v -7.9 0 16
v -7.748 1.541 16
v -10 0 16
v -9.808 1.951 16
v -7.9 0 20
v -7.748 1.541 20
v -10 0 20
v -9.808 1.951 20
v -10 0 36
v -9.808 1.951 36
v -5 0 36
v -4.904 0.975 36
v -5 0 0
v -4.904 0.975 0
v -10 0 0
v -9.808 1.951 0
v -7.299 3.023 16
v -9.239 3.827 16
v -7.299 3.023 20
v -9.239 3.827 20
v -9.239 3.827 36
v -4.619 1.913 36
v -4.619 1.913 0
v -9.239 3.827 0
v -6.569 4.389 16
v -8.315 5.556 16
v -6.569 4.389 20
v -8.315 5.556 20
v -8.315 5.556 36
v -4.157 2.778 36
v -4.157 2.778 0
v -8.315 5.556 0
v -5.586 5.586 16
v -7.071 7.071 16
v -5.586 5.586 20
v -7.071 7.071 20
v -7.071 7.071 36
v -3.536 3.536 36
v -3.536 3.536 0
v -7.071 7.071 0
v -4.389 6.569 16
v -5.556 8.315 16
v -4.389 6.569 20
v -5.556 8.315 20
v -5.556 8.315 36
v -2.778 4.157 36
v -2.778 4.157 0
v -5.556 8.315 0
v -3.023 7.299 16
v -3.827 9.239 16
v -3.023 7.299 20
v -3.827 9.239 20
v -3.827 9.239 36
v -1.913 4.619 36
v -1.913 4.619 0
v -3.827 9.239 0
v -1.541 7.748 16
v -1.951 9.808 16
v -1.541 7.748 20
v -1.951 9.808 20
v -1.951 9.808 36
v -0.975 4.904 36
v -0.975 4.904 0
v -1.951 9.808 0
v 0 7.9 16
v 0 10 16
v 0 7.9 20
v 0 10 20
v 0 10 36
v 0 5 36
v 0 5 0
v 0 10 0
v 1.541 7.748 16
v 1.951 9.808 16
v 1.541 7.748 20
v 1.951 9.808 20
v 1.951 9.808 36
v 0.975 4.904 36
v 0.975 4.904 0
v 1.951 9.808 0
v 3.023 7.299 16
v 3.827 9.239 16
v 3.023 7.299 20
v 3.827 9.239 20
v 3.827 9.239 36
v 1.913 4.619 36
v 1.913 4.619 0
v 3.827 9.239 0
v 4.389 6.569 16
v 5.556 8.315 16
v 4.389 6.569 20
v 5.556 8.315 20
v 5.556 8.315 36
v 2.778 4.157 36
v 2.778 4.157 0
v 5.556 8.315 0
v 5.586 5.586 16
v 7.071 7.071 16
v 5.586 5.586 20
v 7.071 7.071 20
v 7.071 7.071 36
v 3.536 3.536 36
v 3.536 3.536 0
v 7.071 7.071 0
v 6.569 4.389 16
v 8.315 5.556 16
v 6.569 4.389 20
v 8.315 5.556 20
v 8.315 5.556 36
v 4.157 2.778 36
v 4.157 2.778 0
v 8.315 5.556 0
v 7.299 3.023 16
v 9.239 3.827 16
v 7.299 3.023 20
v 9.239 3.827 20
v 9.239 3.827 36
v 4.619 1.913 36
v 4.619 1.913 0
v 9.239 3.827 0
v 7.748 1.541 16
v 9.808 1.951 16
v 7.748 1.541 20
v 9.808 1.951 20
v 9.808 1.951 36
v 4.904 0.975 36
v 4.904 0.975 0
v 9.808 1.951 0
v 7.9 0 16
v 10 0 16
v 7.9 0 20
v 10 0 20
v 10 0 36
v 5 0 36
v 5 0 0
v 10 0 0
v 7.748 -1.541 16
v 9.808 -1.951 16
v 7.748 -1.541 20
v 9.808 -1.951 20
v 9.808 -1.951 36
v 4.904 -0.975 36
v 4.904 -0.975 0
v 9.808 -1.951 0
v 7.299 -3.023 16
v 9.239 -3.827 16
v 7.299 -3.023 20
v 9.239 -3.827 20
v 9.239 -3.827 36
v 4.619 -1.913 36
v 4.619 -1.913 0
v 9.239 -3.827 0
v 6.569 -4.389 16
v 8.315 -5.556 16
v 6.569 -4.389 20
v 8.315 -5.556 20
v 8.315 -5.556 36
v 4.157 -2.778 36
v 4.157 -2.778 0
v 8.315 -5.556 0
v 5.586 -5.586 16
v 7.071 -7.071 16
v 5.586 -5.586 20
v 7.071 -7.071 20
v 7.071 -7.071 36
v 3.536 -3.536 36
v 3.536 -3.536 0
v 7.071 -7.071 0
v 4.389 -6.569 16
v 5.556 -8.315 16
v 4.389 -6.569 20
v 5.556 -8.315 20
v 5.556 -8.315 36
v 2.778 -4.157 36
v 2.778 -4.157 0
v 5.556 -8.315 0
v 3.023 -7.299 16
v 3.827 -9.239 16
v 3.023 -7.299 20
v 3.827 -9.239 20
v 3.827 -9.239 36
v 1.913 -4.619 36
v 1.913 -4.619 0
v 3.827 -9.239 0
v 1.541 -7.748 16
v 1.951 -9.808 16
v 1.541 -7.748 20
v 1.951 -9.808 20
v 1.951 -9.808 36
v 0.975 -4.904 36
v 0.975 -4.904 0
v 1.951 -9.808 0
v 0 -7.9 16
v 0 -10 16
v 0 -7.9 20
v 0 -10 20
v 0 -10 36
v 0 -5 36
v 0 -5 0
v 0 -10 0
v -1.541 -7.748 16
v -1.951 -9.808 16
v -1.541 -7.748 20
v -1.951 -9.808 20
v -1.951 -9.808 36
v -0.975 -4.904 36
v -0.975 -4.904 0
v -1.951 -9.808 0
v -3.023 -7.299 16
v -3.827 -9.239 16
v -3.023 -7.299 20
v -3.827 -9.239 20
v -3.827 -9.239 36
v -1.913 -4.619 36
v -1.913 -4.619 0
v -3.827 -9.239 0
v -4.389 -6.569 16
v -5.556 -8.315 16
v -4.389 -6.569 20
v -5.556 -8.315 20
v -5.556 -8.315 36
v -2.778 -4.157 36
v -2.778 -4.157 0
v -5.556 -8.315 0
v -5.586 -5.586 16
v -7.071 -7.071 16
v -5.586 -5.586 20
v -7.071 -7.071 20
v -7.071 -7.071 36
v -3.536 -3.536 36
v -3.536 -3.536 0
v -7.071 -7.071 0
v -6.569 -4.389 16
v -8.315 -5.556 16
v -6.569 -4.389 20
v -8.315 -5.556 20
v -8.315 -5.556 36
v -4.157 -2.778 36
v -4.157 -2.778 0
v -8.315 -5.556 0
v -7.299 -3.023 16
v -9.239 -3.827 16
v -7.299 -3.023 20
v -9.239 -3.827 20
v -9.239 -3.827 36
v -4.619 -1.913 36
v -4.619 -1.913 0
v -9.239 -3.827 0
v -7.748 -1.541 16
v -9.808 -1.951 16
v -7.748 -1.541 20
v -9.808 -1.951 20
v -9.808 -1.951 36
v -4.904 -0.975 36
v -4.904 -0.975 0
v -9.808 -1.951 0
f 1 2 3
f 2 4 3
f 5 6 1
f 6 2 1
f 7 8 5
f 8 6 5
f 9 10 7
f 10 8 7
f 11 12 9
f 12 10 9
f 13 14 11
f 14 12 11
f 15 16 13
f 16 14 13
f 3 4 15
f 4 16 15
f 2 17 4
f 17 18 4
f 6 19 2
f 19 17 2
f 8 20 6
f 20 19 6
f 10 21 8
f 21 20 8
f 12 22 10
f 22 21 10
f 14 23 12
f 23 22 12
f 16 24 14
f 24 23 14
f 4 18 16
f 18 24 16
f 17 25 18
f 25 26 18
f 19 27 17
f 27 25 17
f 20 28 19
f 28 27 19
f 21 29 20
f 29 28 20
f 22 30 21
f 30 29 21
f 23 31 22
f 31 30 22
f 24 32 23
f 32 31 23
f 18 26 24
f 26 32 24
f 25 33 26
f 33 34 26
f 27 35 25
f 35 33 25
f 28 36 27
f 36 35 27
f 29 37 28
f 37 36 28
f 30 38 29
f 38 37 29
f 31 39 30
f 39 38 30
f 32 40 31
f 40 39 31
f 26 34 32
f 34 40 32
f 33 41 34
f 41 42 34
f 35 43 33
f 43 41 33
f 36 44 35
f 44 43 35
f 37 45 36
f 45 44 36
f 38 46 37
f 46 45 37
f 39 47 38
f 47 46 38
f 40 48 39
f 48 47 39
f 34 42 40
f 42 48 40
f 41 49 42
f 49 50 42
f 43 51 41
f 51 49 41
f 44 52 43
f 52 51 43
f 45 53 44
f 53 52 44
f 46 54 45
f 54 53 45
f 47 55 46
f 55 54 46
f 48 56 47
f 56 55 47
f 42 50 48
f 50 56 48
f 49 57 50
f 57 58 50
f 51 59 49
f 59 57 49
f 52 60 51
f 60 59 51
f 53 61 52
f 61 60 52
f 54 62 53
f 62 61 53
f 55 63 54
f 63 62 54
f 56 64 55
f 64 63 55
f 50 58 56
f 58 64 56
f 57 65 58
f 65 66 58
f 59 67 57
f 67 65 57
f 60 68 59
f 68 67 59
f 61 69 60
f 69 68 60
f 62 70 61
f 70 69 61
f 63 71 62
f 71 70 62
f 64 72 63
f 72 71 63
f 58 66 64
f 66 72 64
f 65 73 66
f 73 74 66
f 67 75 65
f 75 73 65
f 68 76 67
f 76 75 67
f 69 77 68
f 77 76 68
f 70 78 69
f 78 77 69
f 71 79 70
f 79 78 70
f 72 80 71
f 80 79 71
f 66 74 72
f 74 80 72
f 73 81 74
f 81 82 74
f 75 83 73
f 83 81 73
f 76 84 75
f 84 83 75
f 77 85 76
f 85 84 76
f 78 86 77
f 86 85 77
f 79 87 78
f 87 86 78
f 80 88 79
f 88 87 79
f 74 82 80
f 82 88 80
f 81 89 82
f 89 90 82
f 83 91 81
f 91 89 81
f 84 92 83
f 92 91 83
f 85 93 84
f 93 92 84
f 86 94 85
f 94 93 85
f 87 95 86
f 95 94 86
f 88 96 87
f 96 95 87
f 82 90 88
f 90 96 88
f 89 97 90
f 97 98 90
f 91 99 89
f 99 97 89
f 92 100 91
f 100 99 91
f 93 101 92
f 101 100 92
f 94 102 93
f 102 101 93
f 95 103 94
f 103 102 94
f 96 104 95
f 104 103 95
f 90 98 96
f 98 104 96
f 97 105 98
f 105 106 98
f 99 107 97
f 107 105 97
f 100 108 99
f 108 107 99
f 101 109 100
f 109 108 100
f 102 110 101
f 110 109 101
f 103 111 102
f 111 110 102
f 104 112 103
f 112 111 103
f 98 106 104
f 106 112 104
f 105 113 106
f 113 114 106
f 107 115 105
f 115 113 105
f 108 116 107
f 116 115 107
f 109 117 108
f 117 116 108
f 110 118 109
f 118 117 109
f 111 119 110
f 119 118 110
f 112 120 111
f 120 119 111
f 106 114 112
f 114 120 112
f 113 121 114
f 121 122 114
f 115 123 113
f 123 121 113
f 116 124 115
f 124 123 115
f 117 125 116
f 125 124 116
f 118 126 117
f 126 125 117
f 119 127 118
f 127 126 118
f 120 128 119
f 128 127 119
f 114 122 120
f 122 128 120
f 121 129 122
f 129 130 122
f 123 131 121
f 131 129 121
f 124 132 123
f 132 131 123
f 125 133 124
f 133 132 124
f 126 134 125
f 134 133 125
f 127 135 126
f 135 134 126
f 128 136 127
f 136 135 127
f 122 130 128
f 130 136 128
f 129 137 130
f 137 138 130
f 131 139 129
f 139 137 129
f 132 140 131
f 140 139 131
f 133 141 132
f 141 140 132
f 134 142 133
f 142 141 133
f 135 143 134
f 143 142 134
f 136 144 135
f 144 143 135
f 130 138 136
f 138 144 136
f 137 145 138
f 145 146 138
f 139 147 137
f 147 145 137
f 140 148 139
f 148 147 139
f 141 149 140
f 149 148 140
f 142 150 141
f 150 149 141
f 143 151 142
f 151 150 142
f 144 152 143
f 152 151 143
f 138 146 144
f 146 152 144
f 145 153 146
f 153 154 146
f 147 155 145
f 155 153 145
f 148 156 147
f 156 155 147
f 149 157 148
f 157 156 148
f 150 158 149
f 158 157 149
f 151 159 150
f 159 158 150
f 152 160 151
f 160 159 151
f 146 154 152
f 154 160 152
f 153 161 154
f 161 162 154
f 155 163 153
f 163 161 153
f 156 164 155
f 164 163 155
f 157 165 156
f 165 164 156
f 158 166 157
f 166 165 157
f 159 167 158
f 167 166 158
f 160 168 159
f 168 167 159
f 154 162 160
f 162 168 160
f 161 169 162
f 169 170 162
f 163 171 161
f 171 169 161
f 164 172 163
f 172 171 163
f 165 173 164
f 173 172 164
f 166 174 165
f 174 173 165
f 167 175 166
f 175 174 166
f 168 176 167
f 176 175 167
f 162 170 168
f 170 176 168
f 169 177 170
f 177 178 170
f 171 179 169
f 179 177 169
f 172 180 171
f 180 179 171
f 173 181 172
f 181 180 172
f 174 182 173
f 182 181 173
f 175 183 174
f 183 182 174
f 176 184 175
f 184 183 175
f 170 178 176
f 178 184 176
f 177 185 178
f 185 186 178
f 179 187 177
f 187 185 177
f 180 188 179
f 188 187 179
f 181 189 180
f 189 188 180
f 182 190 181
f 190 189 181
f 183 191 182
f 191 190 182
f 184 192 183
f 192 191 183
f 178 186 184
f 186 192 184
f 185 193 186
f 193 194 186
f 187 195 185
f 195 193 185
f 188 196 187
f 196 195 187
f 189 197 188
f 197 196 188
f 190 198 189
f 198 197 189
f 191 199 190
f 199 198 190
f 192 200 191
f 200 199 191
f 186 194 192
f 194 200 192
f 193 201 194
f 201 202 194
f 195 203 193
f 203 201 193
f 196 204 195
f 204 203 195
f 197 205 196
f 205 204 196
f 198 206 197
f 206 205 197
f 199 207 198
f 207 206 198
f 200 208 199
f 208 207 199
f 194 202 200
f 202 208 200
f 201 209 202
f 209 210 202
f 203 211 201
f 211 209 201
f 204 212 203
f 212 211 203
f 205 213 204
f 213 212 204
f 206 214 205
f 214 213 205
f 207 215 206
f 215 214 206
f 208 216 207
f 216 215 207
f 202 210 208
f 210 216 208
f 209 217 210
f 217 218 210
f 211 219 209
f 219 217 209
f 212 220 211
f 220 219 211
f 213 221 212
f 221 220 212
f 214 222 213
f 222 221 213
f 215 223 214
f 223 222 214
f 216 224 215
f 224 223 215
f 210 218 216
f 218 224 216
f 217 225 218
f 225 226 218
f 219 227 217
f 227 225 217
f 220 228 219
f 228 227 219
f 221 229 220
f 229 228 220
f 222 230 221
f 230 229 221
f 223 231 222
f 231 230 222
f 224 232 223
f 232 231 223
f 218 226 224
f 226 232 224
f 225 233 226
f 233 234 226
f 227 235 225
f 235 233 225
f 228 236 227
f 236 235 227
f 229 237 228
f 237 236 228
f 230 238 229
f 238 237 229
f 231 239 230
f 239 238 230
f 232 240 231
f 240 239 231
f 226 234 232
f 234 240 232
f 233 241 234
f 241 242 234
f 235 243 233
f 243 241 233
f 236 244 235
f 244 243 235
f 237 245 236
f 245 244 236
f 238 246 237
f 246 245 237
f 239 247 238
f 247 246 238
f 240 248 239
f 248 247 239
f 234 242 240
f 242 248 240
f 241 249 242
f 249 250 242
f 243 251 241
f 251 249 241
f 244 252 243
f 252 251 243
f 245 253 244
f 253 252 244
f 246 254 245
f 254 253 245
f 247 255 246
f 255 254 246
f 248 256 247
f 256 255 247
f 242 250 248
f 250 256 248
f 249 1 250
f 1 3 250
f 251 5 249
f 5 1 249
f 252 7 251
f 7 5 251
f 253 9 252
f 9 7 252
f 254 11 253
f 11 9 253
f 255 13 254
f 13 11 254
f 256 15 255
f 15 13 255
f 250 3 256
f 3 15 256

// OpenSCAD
$fn = 32;

// ----------------------------------------------------------------------
// Grooved revolve: stepped, bore R5
// ----------------------------------------------------------------------

// --- parameters (mm) ---
bore_r = 5;               // bore radius
outer_r = 10;             // outer radius of the body
total_h = 36;             // overall height, Z
wall = 5;                 // radial wall thickness
groove_w = 4;             // groove width
groove_d = 2.1;           // groove depth
grooves = 1;              // number of outer grooves

bbox_x = 2 * outer_r;  // full diameter
bore_d = 2 * bore_r;  // bore diameter
body_d = 2 * outer_r;  // body diameter
revolve_angle = 360;  // full turn around the Z axis

profile = [[5, 0], [10, 0], [10, 16], [7.9, 16], [7.9, 20], [10, 20], [10, 36], [5, 36]];  // primary outline, 8 points, counter clockwise

// --- the one profile operation ---
rotate_extrude(angle = revolve_angle) polygon(points = profile);
